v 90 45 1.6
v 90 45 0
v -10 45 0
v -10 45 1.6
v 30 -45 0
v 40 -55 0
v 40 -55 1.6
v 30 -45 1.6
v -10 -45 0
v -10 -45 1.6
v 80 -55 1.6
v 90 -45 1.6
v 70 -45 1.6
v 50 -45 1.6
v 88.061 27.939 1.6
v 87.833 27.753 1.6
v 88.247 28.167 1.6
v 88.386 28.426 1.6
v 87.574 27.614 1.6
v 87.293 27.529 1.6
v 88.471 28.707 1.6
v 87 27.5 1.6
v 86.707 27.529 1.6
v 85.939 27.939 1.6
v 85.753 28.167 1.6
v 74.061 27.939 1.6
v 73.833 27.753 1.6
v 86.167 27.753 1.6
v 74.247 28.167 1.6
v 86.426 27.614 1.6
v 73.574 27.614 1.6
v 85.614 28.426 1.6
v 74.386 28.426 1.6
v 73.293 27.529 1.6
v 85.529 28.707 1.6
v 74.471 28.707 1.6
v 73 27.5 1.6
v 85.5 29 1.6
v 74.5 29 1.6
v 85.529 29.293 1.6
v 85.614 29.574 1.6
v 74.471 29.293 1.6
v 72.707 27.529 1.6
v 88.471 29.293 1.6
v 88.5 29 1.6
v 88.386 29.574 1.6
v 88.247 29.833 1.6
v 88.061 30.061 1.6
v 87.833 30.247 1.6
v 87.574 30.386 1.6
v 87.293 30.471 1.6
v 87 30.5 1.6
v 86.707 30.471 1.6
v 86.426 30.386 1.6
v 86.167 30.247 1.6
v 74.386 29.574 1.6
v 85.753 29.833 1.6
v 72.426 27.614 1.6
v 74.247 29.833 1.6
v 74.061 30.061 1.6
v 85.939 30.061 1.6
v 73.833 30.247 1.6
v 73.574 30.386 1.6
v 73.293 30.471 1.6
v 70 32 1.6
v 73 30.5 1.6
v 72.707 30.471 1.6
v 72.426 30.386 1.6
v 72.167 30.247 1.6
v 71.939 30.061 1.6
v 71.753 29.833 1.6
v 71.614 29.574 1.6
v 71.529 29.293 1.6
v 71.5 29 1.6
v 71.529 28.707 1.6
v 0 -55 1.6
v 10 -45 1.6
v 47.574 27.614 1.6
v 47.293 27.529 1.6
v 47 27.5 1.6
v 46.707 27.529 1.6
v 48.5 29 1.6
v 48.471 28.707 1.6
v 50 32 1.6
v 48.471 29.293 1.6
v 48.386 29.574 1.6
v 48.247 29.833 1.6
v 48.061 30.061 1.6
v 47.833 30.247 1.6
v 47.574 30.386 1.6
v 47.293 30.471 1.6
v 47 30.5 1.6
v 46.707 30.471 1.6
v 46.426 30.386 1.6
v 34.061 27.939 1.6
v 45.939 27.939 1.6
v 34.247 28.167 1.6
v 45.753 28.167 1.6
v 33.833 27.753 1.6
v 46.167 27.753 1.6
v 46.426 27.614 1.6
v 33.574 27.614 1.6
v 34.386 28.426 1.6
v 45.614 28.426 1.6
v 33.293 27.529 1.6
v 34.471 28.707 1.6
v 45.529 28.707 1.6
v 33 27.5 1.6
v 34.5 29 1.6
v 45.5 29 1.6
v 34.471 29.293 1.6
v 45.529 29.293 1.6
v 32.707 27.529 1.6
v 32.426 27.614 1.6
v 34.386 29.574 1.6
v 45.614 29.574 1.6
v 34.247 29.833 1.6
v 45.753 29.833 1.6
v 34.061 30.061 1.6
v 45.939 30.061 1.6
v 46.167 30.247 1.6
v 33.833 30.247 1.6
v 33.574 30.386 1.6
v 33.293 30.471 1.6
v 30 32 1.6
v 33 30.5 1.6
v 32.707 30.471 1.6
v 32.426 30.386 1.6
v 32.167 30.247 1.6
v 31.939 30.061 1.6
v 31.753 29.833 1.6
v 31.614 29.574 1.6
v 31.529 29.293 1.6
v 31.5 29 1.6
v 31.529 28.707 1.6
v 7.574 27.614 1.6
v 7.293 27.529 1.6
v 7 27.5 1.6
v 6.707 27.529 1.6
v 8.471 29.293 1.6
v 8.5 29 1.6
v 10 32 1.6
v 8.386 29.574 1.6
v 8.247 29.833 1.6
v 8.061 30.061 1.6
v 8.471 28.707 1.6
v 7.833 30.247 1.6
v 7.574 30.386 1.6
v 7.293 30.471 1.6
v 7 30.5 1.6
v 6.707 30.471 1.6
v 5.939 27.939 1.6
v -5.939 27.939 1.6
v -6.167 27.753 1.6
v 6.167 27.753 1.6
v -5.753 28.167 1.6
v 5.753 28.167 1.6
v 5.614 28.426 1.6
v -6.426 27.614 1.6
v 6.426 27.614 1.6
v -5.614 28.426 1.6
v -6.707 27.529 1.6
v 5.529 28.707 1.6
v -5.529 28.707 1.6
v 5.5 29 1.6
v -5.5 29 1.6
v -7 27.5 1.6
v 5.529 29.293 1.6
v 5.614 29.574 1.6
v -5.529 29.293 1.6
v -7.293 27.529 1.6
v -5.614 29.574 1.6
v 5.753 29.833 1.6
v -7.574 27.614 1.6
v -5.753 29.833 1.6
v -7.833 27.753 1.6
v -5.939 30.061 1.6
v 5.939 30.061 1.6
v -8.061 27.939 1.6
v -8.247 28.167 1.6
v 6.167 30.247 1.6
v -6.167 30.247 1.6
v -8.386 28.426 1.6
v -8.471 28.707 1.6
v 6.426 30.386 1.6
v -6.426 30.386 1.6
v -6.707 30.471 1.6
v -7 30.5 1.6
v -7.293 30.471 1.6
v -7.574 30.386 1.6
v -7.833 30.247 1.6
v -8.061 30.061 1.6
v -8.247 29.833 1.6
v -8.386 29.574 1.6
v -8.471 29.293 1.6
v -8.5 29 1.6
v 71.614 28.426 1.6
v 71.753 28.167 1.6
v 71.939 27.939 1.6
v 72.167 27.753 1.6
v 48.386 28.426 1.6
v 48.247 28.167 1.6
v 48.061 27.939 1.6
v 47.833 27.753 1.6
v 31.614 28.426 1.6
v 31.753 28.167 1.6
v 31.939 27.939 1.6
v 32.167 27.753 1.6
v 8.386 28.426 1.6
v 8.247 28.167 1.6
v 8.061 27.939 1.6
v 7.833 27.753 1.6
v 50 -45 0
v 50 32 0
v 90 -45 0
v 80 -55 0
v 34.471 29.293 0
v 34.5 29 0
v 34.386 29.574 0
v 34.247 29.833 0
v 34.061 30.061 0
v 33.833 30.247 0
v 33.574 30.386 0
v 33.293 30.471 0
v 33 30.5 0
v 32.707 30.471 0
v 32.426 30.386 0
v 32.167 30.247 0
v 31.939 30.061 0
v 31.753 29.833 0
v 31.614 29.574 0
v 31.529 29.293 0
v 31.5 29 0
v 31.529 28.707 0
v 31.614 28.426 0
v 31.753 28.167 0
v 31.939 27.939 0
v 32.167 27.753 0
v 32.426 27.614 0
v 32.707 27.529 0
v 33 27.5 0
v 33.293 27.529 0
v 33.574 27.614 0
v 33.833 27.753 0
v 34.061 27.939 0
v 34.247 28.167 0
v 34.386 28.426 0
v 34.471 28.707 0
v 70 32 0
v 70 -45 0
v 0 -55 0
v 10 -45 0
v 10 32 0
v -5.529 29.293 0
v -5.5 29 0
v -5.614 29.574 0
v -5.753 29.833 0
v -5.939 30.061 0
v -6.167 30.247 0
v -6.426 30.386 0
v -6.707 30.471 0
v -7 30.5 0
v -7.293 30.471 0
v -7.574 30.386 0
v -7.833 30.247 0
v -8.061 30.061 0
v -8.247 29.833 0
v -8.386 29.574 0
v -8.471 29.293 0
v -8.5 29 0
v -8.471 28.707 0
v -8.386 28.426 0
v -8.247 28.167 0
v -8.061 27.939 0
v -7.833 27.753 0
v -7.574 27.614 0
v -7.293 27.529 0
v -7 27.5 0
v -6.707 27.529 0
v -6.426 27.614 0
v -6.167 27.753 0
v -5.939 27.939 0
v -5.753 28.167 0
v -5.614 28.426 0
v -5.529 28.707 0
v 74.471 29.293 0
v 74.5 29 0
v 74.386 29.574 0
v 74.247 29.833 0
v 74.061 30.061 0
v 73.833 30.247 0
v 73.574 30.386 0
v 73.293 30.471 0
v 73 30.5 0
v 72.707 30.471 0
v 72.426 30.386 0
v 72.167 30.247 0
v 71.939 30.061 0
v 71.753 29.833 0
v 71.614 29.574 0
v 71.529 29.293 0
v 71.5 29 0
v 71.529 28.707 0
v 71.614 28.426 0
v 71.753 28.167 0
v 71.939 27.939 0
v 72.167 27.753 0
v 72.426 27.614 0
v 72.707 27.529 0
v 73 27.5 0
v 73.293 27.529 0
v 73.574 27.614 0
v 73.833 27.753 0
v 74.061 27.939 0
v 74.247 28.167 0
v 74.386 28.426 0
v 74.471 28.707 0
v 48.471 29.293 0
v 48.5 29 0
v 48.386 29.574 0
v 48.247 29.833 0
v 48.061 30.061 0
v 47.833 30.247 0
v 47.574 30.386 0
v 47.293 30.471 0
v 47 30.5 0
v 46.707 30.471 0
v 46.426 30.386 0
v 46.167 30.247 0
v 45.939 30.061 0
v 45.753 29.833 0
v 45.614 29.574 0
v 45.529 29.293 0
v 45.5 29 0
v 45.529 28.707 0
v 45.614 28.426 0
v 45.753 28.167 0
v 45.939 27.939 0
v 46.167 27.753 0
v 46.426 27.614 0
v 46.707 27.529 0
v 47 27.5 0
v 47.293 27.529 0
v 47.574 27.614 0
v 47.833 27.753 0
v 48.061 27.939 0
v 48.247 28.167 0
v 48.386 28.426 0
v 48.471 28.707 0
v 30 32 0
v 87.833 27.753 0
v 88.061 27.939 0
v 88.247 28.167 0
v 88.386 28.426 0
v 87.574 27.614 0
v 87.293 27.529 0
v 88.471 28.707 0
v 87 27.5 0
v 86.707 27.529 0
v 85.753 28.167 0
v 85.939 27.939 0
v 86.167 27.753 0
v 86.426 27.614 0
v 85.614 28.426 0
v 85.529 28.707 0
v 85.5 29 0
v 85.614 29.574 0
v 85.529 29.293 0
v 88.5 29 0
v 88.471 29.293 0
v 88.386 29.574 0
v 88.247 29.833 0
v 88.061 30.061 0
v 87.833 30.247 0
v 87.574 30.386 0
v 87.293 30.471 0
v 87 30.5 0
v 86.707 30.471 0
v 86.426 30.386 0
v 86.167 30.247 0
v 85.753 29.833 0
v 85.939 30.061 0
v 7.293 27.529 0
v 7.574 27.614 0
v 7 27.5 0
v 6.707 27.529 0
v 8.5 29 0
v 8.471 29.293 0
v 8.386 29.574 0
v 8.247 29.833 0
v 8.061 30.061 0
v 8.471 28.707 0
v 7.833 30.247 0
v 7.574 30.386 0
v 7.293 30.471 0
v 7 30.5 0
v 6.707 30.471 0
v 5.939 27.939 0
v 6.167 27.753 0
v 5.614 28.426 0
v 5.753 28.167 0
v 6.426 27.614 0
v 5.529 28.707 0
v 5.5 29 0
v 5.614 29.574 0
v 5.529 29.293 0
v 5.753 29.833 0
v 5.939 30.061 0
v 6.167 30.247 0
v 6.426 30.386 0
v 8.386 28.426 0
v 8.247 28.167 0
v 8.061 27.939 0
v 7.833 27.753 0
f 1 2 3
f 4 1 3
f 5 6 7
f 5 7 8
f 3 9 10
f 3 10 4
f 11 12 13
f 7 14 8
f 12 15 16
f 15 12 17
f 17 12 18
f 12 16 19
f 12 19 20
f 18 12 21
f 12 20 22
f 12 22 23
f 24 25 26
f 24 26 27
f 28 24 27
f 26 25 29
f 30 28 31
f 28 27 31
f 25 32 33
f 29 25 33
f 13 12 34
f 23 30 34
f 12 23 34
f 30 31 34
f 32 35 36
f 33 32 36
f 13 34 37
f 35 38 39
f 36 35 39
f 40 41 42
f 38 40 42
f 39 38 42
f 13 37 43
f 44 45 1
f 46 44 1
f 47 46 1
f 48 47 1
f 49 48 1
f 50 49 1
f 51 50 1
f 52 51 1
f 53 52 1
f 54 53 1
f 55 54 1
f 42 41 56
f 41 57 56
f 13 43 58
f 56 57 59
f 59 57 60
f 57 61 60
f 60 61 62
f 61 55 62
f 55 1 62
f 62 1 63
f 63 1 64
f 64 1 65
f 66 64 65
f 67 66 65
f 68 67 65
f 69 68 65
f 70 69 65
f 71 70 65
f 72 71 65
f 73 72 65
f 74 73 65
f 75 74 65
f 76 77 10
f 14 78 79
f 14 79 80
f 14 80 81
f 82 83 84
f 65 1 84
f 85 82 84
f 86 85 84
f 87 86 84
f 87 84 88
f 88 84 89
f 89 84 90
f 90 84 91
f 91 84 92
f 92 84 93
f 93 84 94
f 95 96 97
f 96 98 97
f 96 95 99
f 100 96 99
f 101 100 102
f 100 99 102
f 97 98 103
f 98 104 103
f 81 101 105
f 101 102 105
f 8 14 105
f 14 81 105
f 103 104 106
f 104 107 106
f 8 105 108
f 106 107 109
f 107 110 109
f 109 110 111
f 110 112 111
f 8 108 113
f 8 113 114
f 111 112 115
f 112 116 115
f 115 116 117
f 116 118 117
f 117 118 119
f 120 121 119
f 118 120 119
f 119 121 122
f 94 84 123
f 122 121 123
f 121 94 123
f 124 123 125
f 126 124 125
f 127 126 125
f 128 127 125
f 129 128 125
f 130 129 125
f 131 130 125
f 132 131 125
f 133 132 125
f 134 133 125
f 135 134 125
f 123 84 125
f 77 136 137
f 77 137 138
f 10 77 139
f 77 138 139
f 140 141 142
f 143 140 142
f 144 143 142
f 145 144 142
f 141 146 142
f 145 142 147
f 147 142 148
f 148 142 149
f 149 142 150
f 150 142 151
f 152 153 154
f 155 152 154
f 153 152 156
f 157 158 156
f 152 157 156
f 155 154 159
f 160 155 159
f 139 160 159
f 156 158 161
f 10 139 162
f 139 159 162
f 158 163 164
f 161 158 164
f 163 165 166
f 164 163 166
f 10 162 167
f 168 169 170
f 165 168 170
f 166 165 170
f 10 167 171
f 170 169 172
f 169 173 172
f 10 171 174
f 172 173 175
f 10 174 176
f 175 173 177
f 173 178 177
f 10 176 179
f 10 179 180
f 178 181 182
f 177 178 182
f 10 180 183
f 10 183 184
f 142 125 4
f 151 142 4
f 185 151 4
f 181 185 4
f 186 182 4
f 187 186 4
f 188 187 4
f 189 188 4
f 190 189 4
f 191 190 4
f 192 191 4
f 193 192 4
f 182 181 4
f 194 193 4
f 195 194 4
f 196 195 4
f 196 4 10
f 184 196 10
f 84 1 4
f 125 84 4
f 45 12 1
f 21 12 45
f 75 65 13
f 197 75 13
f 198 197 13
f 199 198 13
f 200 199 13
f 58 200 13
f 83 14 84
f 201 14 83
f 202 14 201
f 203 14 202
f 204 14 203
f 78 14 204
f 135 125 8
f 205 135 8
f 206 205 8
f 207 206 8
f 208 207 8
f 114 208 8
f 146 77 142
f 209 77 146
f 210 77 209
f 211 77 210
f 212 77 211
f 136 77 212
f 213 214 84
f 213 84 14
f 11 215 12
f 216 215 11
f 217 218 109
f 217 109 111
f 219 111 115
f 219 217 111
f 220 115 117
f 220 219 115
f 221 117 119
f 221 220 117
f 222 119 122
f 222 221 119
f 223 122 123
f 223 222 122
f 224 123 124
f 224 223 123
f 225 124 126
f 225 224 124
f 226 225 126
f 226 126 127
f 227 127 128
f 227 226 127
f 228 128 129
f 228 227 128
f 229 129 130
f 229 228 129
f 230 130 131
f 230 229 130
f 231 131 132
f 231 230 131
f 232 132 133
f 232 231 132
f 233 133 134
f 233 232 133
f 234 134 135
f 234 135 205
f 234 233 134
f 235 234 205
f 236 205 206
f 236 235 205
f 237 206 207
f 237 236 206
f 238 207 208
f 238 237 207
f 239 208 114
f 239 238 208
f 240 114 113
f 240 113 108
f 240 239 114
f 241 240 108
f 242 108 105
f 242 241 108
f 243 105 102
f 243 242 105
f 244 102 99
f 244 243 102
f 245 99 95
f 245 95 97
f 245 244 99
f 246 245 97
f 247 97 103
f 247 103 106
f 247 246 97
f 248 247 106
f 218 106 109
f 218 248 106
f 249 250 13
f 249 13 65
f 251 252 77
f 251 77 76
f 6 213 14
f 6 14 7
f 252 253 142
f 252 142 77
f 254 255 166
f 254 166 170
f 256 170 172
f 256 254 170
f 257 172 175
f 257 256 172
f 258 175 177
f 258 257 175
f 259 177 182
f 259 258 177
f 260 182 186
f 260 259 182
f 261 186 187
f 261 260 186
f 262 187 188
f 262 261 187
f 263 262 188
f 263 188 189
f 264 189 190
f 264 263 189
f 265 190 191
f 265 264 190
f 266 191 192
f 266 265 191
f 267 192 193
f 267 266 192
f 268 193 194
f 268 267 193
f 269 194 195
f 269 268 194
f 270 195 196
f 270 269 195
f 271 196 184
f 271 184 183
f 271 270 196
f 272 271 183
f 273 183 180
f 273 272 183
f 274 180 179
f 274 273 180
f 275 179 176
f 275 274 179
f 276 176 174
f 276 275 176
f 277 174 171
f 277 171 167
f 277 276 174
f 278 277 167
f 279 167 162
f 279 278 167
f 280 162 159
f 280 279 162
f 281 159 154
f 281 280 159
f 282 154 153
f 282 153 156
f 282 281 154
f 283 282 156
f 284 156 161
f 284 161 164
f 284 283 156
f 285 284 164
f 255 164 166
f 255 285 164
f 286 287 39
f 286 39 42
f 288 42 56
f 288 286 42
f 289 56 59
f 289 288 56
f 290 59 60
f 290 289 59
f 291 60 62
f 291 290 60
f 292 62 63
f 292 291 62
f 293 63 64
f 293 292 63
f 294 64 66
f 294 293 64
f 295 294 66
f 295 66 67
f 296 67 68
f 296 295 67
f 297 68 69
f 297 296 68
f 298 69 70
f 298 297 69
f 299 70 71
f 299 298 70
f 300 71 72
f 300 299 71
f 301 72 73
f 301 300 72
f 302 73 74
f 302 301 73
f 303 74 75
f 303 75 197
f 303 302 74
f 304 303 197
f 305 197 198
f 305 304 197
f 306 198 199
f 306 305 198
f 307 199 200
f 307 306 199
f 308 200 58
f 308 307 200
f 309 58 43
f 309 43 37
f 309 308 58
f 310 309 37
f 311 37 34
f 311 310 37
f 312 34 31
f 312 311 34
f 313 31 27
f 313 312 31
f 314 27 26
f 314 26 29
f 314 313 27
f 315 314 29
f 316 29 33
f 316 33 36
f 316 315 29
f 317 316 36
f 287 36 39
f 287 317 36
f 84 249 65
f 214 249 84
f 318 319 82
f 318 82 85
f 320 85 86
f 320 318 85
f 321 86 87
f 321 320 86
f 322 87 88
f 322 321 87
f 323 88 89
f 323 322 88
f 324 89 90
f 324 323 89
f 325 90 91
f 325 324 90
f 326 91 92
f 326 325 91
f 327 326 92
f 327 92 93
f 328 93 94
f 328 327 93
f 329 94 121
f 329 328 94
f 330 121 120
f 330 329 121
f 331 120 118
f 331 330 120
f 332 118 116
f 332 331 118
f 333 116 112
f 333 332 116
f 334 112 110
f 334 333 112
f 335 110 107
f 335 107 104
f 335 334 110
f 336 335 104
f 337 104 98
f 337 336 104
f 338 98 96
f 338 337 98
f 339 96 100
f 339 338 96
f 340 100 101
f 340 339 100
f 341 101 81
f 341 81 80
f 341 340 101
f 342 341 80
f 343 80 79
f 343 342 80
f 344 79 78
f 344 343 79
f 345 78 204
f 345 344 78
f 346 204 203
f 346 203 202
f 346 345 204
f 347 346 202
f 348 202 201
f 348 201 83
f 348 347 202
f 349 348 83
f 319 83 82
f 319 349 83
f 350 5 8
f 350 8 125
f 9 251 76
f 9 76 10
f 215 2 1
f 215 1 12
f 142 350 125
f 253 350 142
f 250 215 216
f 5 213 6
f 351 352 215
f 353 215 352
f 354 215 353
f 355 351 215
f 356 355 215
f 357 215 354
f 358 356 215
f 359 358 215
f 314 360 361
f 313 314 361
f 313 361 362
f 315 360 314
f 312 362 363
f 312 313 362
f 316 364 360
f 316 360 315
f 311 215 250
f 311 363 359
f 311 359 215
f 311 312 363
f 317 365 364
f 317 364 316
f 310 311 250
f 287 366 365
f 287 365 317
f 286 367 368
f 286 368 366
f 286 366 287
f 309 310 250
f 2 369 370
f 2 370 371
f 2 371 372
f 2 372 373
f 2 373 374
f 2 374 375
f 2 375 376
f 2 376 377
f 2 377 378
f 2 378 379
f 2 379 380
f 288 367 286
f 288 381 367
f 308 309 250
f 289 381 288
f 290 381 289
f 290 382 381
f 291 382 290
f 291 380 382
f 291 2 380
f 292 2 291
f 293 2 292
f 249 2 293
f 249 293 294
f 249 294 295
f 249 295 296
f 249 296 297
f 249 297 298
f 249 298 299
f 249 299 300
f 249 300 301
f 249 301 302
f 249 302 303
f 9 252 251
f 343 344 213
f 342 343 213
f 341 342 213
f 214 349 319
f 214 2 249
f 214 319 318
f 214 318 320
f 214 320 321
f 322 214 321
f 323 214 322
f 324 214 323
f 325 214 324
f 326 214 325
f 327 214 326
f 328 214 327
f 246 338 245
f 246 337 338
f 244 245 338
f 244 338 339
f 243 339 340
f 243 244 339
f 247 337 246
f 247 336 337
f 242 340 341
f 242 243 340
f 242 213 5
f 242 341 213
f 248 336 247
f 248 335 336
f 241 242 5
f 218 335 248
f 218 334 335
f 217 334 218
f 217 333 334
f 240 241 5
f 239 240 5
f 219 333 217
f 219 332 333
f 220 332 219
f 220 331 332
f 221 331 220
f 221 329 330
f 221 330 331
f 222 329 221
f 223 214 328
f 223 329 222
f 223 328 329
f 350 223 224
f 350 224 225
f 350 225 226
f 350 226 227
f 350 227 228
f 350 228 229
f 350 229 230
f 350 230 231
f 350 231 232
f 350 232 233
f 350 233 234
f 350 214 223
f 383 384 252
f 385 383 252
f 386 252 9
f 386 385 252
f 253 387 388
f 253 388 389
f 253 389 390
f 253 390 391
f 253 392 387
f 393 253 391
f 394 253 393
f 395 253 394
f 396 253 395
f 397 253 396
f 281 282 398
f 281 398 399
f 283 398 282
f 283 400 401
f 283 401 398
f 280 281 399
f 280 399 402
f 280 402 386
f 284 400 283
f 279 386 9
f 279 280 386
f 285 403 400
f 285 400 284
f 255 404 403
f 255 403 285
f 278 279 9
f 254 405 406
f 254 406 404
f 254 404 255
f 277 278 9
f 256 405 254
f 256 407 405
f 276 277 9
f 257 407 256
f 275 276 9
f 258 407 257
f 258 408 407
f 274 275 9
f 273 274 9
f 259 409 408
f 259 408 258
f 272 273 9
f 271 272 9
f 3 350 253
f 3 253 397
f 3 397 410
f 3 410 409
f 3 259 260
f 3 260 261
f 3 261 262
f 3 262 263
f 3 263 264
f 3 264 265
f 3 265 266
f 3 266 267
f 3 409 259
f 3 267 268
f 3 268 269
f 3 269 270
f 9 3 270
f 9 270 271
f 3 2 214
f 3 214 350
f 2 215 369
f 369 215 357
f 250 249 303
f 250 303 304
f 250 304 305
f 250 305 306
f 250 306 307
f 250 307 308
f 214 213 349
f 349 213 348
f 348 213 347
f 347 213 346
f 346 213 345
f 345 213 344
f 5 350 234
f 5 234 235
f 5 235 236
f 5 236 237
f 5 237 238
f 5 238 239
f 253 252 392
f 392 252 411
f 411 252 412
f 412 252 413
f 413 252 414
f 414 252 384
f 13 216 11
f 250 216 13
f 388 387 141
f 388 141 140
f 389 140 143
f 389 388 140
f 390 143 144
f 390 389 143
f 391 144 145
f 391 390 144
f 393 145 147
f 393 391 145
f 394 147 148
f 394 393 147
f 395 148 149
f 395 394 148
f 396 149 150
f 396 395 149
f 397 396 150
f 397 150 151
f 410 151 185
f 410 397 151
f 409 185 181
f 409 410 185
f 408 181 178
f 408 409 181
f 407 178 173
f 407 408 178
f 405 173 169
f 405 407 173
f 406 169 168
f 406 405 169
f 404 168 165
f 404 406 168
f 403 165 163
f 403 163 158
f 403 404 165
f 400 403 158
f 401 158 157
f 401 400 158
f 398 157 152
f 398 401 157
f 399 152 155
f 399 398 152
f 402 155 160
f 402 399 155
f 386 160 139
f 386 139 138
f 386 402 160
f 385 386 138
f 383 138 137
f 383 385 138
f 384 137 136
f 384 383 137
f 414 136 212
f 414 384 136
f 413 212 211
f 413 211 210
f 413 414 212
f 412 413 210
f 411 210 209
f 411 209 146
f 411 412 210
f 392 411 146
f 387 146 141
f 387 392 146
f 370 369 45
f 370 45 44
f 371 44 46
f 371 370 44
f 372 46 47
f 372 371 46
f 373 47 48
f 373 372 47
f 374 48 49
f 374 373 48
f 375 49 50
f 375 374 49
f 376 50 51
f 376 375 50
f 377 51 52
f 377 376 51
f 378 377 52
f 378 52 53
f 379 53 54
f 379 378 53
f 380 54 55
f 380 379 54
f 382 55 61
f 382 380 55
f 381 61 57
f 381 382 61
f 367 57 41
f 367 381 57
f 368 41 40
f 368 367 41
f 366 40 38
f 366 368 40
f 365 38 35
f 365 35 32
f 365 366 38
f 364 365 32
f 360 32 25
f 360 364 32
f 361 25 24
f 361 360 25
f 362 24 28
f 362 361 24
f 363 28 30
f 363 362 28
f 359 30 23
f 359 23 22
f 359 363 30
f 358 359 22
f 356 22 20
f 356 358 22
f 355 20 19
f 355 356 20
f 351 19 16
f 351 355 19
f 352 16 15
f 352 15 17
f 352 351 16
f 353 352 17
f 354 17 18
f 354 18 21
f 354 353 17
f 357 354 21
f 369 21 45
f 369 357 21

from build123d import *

# Parameters (mm, degrees)
IZIM1_R                     = 1.5
Y_KSEKLIK_EKSTR_ZYON1_DEPTH = 1.6


with BuildPart() as part:
    # Çizim1 → Yükseklik-Ekstrüzyon1 (new body)
    with BuildSketch(Plane.XY):
        Polygon((0, -55), (-10, -45), (-10, 45), (10, 45), (90, 45), (90, -45), (80, -55), (70, -45), (70, 32), (50, 32), (50, -45), (40, -55), (30, -45), (30, 32), (10, 32), (10, -45), align=None)
        with Locations((-7, 29)):
            Circle(IZIM1_R, mode=Mode.SUBTRACT)
        with Locations((7, 29)):
            Circle(IZIM1_R, mode=Mode.SUBTRACT)
        with Locations((33, 29)):
            Circle(IZIM1_R, mode=Mode.SUBTRACT)
        with Locations((47, 29)):
            Circle(IZIM1_R, mode=Mode.SUBTRACT)
        with Locations((73, 29)):
            Circle(IZIM1_R, mode=Mode.SUBTRACT)
        with Locations((87, 29)):
            Circle(IZIM1_R, mode=Mode.SUBTRACT)
    extrude(amount=Y_KSEKLIK_EKSTR_ZYON1_DEPTH)


solid = part.part
